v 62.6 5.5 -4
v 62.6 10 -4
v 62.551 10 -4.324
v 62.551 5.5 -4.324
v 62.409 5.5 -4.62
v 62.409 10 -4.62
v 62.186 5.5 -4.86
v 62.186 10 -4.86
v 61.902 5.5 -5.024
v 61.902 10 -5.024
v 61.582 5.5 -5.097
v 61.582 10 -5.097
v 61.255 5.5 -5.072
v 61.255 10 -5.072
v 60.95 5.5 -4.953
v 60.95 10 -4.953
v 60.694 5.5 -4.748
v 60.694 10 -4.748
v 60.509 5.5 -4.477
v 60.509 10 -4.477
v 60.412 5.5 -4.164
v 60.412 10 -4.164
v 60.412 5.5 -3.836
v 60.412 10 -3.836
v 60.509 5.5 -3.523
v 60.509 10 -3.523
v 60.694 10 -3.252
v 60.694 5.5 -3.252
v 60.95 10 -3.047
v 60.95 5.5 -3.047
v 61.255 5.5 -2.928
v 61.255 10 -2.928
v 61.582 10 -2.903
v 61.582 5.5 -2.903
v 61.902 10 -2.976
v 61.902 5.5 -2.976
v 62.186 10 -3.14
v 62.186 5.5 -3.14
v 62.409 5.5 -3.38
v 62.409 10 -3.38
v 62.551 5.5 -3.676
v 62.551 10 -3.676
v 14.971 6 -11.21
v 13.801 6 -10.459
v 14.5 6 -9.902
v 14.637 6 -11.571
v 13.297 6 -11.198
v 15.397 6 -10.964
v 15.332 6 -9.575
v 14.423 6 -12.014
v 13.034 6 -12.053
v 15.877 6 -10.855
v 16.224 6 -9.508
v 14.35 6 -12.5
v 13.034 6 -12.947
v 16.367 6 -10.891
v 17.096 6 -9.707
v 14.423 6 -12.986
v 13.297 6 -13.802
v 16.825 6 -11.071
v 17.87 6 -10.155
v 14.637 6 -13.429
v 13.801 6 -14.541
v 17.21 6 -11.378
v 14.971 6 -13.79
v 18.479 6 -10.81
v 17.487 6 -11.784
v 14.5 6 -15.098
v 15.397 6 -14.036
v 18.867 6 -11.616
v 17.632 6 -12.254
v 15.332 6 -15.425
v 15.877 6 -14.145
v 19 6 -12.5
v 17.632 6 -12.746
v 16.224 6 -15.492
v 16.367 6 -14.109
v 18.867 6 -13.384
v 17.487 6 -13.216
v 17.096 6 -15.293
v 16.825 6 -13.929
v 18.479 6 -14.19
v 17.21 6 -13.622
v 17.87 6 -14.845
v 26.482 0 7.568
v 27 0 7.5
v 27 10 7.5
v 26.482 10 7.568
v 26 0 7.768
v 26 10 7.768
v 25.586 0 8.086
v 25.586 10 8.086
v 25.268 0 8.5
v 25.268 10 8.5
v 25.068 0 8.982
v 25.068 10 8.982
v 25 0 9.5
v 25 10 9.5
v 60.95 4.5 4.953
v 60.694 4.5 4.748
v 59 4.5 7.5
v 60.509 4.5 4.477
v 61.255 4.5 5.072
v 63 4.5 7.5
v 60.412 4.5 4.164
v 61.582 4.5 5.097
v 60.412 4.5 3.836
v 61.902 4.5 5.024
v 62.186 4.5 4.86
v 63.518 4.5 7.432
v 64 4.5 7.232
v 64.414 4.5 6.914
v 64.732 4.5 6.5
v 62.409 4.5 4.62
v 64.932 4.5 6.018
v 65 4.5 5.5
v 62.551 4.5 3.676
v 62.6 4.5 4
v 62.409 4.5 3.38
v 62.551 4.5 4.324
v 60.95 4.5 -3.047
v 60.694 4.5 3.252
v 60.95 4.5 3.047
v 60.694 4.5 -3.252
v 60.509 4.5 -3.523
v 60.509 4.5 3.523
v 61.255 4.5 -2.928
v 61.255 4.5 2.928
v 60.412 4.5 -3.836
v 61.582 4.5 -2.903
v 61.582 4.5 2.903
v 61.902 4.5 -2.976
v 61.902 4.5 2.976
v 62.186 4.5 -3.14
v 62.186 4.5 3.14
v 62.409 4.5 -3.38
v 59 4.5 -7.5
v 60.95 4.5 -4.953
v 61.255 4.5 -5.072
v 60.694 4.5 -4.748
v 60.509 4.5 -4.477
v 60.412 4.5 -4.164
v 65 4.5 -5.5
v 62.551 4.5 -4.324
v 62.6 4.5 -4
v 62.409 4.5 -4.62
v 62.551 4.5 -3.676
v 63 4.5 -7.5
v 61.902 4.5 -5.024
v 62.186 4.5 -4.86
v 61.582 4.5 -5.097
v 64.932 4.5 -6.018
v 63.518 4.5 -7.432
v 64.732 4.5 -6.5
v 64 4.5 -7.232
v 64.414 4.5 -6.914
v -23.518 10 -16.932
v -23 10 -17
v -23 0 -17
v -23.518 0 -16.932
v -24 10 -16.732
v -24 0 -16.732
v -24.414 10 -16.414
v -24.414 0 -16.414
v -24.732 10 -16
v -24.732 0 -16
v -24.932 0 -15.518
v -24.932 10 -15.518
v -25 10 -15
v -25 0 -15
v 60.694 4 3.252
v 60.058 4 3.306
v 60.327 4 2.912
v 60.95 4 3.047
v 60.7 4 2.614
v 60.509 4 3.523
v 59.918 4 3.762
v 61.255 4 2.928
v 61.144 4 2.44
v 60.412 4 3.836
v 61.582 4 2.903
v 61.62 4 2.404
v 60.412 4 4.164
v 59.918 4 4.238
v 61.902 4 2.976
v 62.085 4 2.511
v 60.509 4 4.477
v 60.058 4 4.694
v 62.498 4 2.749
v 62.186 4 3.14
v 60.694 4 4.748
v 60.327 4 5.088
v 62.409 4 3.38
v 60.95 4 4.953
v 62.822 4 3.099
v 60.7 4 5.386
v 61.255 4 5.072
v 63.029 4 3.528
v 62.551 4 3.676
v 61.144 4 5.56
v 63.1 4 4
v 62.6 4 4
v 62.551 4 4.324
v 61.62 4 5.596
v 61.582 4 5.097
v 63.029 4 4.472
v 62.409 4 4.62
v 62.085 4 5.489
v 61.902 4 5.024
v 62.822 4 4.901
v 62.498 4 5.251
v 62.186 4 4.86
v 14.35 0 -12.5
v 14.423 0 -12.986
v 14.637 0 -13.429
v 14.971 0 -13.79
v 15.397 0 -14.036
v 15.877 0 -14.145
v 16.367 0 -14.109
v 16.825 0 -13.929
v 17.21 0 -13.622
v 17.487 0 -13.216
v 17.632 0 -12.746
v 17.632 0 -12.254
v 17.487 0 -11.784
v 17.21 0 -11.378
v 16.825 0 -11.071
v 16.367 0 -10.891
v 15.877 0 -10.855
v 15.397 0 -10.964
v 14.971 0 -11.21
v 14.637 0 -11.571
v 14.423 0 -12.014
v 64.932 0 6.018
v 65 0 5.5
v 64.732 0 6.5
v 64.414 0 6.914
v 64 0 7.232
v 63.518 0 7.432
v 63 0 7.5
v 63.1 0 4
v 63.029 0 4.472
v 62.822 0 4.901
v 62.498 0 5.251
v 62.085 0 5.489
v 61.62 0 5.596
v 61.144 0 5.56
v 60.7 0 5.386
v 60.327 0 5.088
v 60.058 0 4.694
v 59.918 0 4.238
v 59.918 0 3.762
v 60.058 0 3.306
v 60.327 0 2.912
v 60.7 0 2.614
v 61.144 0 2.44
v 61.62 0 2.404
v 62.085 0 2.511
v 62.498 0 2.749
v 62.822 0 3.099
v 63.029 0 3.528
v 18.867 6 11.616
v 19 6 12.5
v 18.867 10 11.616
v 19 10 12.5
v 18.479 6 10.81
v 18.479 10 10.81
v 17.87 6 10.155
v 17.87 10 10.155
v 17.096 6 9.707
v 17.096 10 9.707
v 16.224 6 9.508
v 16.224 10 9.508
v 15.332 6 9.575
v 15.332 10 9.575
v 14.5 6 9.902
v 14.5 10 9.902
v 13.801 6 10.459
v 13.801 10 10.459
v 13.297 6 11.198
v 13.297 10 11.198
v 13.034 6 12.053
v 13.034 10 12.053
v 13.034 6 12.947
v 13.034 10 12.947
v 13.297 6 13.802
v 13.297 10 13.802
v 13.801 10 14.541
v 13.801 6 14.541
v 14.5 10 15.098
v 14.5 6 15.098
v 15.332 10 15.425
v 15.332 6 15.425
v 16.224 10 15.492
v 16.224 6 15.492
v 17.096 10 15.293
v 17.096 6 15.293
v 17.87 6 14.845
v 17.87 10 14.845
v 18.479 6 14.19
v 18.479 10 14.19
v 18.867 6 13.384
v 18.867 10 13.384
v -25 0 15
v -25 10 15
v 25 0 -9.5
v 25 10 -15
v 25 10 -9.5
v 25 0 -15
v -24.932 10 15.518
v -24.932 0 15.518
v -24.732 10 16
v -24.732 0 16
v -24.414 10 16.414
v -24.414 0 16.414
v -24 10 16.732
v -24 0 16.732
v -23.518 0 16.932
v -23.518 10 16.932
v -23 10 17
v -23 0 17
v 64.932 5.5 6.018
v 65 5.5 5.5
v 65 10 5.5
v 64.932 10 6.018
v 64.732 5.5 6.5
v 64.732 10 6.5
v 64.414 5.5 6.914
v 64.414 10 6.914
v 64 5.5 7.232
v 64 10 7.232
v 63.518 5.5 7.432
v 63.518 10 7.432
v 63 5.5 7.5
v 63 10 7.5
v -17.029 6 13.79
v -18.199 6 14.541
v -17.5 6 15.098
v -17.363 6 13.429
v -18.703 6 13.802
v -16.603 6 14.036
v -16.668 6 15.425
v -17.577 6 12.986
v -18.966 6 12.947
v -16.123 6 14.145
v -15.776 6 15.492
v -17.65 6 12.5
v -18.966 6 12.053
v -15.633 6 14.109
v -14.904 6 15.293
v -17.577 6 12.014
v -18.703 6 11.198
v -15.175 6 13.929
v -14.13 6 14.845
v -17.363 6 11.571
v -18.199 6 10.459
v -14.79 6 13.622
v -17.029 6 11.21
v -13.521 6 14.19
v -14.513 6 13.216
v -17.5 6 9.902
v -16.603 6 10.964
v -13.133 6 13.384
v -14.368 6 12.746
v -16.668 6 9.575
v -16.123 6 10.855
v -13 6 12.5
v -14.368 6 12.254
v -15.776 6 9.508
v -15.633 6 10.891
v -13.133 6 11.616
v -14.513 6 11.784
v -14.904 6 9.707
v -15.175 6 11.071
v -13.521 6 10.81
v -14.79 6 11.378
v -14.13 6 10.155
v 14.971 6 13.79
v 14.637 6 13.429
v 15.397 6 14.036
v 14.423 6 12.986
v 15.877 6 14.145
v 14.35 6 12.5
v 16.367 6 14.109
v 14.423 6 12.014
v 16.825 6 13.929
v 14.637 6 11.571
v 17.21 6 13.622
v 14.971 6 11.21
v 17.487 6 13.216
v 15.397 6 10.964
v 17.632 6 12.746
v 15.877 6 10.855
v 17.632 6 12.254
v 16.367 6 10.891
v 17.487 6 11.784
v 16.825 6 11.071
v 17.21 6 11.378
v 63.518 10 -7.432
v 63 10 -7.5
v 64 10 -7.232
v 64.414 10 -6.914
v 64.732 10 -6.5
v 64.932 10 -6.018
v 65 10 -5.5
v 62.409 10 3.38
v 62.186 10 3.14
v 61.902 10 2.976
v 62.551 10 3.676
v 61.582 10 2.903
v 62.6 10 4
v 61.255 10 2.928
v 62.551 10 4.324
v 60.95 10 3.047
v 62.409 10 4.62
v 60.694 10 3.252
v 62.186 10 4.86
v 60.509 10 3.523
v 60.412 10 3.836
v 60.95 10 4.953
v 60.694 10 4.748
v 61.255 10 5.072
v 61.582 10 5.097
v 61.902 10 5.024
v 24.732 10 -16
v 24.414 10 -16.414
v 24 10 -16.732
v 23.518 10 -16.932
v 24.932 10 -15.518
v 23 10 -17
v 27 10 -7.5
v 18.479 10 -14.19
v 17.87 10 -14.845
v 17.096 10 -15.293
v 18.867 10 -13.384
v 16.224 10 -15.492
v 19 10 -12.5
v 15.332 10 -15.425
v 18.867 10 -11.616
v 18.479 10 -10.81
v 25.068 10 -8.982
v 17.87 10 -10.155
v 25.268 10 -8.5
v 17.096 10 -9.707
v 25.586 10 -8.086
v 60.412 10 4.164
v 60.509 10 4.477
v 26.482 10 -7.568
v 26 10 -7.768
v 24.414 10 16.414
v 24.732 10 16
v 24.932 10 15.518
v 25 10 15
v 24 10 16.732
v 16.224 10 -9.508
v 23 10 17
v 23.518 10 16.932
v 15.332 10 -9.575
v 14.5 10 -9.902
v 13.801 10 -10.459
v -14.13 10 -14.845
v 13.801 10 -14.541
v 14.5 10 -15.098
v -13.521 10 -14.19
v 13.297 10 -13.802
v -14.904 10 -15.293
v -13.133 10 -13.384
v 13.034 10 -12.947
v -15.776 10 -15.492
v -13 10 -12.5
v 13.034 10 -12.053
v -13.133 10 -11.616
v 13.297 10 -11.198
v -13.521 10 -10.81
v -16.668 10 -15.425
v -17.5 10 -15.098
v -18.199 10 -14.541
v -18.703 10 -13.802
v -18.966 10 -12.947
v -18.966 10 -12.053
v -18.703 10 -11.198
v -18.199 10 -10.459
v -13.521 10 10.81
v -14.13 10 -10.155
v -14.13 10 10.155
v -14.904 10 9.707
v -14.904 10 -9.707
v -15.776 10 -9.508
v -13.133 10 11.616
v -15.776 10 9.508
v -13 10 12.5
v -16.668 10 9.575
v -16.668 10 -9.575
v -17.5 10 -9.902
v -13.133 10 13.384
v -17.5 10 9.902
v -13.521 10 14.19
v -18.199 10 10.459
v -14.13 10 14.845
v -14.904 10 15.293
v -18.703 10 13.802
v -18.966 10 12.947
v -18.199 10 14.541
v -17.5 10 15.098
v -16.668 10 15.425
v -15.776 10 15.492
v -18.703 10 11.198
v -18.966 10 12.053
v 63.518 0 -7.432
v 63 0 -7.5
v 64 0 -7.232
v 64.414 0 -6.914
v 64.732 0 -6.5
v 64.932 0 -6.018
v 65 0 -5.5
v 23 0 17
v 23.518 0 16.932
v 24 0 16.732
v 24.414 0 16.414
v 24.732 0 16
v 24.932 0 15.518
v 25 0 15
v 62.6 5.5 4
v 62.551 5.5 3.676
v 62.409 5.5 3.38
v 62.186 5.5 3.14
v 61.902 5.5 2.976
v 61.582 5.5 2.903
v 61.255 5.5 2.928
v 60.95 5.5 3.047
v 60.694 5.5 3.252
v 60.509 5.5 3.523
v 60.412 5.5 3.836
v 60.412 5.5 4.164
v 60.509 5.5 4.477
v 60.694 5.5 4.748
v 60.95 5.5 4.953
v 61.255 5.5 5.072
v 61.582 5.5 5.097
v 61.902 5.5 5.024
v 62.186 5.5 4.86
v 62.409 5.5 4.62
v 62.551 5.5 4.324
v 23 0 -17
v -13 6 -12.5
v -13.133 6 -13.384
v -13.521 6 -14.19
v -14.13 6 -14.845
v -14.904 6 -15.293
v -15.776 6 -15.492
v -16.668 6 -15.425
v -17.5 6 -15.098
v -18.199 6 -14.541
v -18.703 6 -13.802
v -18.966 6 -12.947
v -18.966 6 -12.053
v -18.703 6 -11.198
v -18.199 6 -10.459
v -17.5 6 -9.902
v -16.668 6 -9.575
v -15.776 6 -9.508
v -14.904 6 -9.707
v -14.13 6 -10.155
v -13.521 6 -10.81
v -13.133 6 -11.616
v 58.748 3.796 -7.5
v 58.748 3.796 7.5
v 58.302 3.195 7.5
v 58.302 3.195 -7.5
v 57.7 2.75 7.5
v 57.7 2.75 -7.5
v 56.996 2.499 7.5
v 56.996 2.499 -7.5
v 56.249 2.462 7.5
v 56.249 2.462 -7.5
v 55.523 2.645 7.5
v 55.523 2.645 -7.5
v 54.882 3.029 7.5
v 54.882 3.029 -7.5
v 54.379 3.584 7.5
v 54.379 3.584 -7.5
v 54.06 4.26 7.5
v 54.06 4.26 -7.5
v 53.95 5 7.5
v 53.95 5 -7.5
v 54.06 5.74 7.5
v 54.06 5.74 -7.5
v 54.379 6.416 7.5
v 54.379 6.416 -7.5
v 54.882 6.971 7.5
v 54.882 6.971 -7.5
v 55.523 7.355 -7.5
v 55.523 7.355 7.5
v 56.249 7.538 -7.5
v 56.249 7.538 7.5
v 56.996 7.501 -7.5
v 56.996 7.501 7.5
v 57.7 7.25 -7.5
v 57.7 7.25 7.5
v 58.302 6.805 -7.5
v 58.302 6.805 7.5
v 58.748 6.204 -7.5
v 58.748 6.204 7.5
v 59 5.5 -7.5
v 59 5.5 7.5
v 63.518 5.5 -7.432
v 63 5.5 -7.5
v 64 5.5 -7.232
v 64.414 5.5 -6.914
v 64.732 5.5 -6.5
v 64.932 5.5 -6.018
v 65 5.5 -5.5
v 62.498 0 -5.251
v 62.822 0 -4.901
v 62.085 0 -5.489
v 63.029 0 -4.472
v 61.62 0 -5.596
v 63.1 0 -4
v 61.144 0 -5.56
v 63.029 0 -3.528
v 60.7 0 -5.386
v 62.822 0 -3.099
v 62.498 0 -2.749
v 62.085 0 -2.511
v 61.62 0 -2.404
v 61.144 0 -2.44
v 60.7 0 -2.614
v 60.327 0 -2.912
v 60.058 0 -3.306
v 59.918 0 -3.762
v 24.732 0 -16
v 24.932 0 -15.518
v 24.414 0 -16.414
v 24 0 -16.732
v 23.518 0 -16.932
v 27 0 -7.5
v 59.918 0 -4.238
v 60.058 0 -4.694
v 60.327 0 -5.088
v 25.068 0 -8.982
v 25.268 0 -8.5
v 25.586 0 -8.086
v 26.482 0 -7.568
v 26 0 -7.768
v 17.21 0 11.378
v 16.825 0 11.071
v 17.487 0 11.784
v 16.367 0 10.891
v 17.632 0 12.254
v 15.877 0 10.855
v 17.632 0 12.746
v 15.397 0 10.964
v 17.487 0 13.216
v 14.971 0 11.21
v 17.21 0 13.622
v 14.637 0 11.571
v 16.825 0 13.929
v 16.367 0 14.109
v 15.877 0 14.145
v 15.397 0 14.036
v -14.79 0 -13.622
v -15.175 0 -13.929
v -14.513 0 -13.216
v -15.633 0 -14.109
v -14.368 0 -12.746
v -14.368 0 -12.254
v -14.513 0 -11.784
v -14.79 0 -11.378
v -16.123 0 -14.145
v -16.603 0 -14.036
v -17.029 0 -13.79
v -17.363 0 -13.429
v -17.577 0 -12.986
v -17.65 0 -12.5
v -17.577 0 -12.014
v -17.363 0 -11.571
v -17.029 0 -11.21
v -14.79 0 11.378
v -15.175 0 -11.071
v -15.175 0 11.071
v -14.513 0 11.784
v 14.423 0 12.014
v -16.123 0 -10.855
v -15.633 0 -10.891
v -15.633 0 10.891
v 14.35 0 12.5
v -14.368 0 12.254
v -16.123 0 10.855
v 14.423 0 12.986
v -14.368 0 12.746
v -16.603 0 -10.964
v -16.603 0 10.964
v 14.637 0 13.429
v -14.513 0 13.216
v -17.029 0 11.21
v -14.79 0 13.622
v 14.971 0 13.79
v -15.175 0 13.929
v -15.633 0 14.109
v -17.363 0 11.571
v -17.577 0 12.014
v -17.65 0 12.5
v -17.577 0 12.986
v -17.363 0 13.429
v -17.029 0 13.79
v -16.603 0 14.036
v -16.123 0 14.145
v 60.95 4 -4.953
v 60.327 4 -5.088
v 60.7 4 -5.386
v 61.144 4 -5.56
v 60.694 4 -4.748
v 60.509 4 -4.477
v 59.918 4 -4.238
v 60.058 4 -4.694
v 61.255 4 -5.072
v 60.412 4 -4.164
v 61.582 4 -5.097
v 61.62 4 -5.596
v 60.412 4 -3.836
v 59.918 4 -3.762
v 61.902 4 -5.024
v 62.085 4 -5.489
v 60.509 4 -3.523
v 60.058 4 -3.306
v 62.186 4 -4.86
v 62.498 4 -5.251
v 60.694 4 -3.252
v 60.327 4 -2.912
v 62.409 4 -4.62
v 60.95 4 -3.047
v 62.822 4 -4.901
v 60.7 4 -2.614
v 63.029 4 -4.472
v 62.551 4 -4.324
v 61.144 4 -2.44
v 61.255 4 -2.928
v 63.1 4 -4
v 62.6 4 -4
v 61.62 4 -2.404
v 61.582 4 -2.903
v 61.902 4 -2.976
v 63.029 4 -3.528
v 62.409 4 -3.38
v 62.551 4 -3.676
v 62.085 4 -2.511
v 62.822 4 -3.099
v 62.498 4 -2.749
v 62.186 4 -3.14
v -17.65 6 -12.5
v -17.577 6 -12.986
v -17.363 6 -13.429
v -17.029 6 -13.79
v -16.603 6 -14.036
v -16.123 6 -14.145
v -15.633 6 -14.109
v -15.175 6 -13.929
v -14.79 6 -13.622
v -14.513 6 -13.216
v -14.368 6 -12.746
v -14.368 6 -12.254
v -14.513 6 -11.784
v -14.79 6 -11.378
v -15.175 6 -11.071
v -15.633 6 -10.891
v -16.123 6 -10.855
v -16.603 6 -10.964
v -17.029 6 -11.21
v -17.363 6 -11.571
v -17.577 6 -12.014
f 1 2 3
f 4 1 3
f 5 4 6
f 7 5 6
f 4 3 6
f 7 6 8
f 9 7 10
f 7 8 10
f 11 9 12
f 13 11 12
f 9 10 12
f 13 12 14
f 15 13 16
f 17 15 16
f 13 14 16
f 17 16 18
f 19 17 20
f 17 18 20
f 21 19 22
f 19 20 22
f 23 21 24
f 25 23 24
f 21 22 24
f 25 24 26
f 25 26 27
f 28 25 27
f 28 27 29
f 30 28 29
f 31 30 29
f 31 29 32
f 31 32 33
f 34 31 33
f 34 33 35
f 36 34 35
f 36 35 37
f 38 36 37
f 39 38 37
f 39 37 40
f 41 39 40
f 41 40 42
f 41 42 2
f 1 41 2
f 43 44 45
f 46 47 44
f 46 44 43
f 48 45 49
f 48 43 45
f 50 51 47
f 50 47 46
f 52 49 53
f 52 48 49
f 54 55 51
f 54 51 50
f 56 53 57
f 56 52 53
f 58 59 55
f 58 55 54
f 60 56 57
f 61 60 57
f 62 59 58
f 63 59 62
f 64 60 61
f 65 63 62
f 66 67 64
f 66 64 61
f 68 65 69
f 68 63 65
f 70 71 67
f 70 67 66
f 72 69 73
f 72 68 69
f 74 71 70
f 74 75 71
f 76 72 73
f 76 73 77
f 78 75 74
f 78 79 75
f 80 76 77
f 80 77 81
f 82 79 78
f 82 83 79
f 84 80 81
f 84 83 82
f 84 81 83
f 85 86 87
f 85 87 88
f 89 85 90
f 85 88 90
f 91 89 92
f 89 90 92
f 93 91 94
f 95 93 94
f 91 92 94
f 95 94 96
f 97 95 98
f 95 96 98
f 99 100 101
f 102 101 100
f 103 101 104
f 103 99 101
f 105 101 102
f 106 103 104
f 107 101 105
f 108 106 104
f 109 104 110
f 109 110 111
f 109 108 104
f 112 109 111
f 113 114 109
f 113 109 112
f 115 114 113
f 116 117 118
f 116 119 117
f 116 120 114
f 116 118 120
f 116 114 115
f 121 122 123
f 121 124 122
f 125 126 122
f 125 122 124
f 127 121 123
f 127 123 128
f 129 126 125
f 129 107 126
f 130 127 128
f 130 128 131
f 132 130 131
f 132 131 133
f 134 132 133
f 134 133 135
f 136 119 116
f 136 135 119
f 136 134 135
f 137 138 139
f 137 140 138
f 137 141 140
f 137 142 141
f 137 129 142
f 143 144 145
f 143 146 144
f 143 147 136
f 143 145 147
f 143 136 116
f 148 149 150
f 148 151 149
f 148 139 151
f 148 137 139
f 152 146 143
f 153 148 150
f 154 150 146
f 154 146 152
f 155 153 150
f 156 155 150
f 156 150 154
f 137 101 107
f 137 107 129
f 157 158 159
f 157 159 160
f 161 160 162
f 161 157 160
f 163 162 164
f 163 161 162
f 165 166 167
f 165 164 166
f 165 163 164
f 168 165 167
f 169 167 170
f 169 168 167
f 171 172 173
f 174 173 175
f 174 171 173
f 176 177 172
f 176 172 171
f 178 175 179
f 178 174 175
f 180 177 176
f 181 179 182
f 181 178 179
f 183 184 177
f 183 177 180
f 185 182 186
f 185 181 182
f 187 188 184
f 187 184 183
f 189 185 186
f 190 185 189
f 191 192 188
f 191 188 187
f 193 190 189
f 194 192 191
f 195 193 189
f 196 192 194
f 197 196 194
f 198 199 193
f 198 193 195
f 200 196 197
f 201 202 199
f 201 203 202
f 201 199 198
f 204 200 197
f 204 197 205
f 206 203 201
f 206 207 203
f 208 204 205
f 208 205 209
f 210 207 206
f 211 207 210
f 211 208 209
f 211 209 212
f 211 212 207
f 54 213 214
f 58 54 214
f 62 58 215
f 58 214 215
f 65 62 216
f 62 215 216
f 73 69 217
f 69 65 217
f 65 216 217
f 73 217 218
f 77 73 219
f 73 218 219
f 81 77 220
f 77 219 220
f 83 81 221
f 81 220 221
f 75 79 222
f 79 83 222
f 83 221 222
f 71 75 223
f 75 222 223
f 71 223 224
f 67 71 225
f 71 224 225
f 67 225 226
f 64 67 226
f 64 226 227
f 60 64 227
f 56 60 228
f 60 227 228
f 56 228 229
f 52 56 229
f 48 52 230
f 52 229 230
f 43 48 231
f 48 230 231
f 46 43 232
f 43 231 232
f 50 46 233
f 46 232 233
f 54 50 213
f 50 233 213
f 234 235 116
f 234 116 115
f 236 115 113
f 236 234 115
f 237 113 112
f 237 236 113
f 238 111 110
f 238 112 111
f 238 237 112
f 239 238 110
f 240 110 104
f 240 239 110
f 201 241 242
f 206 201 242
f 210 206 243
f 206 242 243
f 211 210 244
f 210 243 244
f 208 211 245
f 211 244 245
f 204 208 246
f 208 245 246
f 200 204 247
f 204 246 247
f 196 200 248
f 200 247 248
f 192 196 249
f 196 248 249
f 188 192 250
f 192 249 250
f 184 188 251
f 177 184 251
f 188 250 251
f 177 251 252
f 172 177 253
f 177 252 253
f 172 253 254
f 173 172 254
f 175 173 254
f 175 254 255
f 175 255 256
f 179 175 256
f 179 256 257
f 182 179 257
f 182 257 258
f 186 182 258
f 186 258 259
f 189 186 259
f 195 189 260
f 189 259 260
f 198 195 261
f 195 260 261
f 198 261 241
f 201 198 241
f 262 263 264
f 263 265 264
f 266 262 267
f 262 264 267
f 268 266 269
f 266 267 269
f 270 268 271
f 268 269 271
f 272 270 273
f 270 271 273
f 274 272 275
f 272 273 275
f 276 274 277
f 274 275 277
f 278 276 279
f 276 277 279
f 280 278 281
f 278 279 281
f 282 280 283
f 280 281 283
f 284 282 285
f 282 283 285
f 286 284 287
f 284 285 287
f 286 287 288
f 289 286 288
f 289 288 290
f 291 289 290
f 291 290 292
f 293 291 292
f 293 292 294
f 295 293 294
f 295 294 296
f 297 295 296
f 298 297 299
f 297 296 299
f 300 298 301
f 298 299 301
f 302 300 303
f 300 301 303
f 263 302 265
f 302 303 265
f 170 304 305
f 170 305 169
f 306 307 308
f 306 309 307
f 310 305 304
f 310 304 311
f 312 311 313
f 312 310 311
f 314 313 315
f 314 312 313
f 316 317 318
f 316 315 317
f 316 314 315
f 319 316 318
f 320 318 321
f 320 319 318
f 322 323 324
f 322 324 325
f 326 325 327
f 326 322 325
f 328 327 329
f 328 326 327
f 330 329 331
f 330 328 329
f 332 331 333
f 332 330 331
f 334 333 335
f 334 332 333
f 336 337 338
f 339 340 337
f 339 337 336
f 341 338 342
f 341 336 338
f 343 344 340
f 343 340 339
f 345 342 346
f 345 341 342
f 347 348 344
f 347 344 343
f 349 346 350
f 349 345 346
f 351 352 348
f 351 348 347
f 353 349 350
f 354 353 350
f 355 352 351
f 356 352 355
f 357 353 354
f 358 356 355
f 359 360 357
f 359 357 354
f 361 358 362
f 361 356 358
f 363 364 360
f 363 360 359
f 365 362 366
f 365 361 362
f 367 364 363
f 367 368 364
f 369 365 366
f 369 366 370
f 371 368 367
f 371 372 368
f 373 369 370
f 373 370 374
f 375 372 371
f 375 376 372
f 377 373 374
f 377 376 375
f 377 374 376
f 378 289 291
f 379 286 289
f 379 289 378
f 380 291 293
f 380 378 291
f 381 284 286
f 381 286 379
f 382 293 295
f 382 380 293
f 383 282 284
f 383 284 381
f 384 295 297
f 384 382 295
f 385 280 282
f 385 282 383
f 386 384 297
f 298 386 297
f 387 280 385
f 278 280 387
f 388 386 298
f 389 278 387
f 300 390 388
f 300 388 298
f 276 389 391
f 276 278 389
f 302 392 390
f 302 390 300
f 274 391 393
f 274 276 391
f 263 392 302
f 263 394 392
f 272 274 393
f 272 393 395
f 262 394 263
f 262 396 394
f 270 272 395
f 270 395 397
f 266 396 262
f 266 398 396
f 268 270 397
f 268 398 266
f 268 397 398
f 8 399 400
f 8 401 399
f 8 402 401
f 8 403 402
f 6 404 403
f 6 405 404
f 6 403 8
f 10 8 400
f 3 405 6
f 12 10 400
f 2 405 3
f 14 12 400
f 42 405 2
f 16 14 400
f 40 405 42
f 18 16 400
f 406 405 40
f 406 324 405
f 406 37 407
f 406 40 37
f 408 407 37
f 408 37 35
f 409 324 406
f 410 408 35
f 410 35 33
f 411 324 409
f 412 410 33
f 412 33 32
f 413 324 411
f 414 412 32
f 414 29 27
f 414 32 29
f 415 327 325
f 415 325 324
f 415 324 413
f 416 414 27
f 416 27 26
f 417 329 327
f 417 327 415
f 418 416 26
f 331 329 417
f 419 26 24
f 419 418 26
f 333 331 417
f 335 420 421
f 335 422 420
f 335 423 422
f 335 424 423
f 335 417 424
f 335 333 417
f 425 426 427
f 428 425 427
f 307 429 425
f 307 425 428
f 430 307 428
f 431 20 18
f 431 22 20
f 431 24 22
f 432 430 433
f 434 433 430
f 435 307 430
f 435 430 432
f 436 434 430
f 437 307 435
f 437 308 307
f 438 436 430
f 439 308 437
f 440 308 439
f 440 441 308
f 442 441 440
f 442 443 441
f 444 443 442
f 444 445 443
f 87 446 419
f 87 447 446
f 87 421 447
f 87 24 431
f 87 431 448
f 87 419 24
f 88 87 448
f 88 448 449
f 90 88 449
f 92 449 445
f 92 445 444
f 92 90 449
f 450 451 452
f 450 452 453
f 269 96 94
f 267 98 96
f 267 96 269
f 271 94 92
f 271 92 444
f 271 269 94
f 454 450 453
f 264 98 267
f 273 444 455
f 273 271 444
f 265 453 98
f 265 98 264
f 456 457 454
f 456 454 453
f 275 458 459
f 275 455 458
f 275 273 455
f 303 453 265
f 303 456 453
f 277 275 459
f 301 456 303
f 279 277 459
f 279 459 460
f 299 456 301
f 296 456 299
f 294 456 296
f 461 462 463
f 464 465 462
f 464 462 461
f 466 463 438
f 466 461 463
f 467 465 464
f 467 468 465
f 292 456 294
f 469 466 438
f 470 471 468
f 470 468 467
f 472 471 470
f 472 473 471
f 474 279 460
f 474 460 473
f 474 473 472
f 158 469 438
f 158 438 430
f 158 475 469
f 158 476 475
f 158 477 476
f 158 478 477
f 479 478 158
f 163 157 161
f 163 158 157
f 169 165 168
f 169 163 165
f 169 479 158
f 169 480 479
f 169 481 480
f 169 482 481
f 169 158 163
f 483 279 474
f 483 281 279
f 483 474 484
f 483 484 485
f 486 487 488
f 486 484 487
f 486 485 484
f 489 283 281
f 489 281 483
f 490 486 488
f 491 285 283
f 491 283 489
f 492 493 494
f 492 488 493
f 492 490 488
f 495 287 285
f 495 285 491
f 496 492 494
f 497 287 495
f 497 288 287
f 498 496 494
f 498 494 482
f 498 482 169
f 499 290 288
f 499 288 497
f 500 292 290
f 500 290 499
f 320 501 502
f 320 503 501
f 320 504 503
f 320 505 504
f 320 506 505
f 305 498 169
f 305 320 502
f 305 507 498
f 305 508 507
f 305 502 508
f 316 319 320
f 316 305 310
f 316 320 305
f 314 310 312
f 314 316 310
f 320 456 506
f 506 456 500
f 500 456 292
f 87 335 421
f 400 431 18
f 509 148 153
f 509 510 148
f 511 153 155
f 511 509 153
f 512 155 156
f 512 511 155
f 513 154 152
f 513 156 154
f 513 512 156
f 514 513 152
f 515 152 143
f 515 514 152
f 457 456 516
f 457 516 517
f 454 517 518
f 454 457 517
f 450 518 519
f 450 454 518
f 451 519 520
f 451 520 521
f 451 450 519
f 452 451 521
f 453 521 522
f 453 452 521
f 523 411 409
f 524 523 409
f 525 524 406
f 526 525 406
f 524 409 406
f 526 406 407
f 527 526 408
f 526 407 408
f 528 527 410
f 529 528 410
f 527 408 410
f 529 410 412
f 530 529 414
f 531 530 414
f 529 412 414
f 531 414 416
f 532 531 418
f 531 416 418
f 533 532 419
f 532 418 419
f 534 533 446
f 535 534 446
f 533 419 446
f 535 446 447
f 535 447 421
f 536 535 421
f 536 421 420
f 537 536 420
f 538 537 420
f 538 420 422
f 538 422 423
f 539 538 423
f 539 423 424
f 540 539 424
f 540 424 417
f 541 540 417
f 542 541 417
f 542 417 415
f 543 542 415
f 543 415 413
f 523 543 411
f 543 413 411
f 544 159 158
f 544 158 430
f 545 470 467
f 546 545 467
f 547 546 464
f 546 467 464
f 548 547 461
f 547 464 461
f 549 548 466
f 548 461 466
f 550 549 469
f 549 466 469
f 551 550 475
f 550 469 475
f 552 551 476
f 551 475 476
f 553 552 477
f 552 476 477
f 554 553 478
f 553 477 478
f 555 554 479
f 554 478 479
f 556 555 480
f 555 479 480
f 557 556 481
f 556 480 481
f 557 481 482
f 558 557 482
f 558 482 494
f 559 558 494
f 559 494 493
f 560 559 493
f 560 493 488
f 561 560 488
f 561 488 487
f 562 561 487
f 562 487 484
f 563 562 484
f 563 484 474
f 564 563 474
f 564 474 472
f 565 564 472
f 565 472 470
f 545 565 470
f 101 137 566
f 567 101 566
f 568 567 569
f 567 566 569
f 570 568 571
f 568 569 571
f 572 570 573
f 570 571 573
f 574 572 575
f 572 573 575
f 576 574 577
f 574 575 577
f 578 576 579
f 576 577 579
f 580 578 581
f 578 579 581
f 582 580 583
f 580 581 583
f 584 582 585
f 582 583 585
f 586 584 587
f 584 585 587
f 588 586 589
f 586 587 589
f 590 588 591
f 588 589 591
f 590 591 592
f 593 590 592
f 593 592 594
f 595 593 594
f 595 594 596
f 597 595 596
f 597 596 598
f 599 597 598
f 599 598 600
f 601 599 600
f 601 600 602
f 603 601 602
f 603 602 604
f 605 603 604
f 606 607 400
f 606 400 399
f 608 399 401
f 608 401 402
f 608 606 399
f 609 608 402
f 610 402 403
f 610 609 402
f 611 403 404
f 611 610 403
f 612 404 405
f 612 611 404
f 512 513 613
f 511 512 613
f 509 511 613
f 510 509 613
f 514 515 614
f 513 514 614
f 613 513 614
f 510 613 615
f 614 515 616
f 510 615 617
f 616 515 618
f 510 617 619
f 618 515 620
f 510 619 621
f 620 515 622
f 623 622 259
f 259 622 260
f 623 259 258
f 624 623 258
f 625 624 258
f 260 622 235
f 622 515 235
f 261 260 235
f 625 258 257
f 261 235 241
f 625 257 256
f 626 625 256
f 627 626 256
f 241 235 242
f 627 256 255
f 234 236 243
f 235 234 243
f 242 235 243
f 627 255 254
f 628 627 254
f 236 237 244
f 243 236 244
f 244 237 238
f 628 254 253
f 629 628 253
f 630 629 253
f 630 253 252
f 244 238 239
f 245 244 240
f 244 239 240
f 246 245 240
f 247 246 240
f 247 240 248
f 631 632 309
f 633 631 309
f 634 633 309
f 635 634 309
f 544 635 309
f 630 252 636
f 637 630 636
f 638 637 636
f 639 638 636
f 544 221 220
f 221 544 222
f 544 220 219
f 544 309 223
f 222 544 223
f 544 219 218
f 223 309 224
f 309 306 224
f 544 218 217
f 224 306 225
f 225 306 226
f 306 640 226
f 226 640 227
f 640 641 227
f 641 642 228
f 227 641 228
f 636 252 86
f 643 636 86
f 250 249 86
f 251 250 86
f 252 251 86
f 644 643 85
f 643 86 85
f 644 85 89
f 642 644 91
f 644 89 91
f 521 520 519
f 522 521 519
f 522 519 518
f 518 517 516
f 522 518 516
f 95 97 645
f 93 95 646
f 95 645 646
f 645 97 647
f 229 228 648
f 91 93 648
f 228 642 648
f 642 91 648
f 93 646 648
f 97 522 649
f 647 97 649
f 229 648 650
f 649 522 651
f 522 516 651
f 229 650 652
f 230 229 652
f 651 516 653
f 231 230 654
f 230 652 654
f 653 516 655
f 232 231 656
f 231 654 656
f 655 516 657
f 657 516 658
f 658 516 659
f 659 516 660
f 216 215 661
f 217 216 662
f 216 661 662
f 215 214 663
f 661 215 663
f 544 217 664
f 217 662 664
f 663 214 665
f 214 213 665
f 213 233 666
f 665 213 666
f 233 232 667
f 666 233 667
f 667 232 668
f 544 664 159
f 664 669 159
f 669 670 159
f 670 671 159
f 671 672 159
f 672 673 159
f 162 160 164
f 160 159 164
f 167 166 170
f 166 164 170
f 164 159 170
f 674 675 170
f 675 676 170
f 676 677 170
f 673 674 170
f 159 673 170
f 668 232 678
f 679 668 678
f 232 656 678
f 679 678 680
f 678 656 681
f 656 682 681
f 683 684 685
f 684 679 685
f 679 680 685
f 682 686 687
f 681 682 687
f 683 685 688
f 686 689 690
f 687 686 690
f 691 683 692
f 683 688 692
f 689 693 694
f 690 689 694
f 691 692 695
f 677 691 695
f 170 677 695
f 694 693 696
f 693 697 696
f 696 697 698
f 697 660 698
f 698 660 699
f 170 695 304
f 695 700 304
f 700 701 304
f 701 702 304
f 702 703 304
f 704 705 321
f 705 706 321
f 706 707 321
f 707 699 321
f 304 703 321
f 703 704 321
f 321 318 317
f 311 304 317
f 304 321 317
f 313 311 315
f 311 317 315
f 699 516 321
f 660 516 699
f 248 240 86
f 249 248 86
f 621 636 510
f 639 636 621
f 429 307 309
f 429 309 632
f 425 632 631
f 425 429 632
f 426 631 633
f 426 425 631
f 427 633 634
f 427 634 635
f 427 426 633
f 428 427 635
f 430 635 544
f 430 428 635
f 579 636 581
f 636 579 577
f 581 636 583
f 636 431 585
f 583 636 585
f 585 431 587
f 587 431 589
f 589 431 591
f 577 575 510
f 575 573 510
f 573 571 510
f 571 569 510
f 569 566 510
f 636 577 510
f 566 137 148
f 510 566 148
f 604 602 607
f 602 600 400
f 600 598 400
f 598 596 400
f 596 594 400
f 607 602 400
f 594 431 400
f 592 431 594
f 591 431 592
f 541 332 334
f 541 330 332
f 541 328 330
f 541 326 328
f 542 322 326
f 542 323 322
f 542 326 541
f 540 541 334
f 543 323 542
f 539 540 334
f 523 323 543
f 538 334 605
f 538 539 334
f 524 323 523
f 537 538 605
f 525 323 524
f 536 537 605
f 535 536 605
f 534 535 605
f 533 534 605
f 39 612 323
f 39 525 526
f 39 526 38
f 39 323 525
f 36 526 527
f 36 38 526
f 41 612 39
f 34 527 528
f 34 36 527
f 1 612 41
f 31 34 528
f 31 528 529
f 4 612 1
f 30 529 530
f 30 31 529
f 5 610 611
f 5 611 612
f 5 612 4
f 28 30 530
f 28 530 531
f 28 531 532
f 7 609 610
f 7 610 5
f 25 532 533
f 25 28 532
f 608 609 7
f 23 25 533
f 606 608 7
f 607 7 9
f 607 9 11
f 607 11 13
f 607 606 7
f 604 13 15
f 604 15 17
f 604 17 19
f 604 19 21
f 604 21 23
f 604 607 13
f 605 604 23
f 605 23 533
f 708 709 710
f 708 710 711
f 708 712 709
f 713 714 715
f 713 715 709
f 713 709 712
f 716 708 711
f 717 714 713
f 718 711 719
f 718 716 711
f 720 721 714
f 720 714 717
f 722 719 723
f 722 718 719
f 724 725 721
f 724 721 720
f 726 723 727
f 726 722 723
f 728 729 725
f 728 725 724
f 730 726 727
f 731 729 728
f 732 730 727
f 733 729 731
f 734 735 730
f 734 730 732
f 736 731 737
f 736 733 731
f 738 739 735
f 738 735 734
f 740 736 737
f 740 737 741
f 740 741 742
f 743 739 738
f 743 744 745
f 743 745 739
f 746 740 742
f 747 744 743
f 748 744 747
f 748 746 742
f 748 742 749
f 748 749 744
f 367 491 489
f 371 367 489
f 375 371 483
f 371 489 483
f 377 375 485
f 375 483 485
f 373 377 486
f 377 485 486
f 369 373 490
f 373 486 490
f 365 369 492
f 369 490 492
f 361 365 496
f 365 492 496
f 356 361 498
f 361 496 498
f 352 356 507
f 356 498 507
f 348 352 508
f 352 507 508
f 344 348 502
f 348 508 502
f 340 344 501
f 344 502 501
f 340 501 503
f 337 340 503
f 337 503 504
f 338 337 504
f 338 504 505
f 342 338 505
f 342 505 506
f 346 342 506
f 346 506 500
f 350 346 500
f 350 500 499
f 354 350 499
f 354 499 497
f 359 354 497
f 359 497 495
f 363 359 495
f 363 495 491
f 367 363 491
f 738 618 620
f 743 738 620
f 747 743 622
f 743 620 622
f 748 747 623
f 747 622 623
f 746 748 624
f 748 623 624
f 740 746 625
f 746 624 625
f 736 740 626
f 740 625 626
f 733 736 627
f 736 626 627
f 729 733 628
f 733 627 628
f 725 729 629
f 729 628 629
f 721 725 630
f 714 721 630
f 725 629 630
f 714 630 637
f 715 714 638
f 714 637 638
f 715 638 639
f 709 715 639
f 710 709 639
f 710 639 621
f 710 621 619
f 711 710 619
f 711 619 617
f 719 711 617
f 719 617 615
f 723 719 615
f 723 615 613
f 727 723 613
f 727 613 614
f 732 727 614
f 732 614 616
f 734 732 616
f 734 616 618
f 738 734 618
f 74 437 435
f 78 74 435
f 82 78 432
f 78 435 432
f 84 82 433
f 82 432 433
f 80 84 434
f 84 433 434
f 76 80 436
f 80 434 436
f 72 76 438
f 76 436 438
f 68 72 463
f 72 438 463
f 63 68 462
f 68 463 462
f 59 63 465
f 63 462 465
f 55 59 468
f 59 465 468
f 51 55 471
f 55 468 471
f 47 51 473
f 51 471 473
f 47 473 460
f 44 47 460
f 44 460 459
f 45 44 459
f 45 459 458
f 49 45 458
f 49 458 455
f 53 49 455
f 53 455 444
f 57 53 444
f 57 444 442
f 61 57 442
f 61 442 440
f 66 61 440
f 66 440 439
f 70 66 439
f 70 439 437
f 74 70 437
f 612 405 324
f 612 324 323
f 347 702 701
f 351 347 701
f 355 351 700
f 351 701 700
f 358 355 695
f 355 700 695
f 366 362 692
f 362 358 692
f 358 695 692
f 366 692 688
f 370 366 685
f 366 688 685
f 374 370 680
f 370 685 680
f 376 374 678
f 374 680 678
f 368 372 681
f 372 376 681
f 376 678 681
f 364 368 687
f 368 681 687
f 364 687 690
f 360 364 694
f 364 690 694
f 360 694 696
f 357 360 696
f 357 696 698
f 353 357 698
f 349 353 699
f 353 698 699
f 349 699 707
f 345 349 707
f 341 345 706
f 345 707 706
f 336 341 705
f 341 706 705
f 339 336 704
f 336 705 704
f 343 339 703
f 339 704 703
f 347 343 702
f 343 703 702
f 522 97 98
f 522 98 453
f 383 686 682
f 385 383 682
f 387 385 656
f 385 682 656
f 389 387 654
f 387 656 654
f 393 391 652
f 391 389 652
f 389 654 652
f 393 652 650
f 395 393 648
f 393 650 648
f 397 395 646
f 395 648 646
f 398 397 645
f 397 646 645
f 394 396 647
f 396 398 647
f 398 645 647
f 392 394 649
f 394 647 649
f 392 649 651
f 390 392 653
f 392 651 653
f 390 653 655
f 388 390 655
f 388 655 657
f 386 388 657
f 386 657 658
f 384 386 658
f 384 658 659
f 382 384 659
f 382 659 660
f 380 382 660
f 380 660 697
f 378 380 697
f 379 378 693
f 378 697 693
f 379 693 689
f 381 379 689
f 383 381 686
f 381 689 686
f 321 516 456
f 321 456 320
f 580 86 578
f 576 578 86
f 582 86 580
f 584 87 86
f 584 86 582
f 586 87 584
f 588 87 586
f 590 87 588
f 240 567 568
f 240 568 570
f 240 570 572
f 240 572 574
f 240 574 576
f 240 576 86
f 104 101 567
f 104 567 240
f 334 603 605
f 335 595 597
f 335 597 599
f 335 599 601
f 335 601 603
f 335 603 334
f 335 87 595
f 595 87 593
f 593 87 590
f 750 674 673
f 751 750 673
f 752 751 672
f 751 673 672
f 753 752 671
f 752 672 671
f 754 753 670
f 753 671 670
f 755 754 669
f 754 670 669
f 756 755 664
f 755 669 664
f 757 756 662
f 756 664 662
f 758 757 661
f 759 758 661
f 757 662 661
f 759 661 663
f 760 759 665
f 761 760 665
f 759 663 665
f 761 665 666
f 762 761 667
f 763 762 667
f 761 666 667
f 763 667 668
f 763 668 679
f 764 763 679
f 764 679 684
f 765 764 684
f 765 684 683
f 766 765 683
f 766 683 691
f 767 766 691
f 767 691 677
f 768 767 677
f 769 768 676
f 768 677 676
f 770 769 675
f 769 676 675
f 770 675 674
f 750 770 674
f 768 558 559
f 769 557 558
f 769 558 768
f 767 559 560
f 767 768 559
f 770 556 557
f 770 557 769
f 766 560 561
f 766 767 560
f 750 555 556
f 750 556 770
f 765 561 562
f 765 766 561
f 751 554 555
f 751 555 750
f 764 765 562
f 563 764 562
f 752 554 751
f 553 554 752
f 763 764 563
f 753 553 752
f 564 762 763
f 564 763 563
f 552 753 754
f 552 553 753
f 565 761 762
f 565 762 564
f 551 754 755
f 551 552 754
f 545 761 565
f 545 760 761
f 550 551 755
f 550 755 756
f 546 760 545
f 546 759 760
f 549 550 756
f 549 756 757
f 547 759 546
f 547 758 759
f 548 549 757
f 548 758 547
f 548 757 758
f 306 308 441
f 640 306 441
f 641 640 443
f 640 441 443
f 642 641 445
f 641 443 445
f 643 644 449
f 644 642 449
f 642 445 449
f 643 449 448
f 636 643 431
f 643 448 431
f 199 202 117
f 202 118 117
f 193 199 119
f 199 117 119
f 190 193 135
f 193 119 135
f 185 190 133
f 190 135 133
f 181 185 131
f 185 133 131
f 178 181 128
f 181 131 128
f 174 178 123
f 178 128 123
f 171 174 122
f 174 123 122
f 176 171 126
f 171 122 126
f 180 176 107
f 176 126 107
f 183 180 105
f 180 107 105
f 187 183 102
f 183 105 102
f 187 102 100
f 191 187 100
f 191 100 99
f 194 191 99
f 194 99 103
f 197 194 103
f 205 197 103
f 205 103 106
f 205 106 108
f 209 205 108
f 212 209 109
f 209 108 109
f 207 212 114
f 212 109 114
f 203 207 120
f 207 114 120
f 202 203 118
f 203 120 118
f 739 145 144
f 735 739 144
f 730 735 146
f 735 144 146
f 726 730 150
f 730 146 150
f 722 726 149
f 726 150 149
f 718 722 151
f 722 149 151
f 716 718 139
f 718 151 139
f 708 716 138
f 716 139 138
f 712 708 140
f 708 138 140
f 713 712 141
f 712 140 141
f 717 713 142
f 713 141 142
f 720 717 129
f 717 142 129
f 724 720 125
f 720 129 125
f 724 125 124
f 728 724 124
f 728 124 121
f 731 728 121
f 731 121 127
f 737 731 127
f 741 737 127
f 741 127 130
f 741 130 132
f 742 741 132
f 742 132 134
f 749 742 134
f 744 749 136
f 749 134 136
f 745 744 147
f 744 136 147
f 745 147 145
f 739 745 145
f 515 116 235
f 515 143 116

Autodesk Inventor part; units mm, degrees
ref_plane "YZ Plane" through (0, 0, 0) normal (1, 0, 0) x (0, 1, 0)
ref_plane "XZ Plane" through (0, 0, 0) normal (0, 1, 0) x (-1, 0, 0)
ref_plane "XY Plane" through (0, 0, 0) normal (0, 0, 1) x (1, 0, 0)
sketch "Sketch1" plane through (0, 0, 0) normal (0, 1, 0) x (-1, 0, 0)
  line L0 (-16, 12.5) -> (16, 12.5) construction
  line L1 (16, 12.5) -> (16, -12.5) construction
  line L2 (16, -12.5) -> (-16, -12.5) construction
  line L3 (-16, -12.5) -> (-16, 12.5) construction
  line L4 (-16, 12.5) -> (16, -12.5) construction
  line L5 (16, 12.5) -> (-16, -12.5) construction
  circle A0 centre (16, 12.5) radius 1.65
  circle A1 centre (16, -12.5) radius 1.65
  circle A2 centre (-16, -12.5) radius 1.65
  circle A3 centre (-16, 12.5) radius 1.65
  line L6 (-25, 17) -> (25, 17)
  line L7 (25, 17) -> (25, -17)
  line L8 (25, -17) -> (-25, -17)
  line L9 (-25, -17) -> (-25, 17)
  line L10 (-25, 17) -> (25, -17) construction
  line L11 (25, 17) -> (-25, -17) construction
  point P0 (0, 0)
  dimension "d0" = 32
  dimension "d1" = 25
  dimension "d2" = 3.3
  dimension "d3" = 3.3
  dimension "d4" = 3.3
  dimension "d5" = 3.3
  dimension "d6" = 50
  dimension "d7" = 34
extrude "Extrusion1" add sketch "Sketch1" along normal blind 10
sketch "Sketch2" plane through (0, 10, 0) normal (0, 1, 0) x (1, 0, 0)
  line L0 (-24, -7.5) -> (-12, -7.5)
  line L1 (-12, -7.5) -> (-12, 7.5)
  line L2 (-12, 7.5) -> (-24, 7.5)
  line L3 (-24, 7.5) -> (-24, -7.5)
  line L4 (-24, -7.5) -> (-12, 7.5) construction
  line L5 (-12, -7.5) -> (-24, 7.5) construction
  circle A0 centre (-16, -12.5) radius 1.65 projected
  circle A1 centre (-16, -12.5) radius 3 construction
  point P0 (0, 0)
  point P1 (-18, 0)
  dimension "d10" = 18
  dimension "d11" = 15
  dimension "d12" = 6
  dimension "d13" = 12
extrude "Extrusion2" [suppressed]
sketch "Sketch5" plane through (0, 0, 0) normal (0, 0, 1) x (1, 0, 0)
  line L0 (25, 10) -> (-25, 10) projected
  line L1 (-21.2587, 10) -> (-11, 10)
  line L2 (-11, 10) -> (-11, 19.7515)
  line L3 (-11, 19.7515) -> (-17.6064, 31.6553)
  line L4 (-17.6064, 31.6553) -> (-28.0988, 25.8321)
  line L5 (-28.0988, 25.8321) -> (-21.2587, 13.5072)
  line L6 (-21.2587, 13.5072) -> (-21.2587, 10)
  circle A0 centre (-18, 20) radius 2.6308
  line L7 (-25, 0) -> (-25, 10) projected
  point P0 (0, 0)
  dimension "d22" = 7
  dimension "d23" = 10
  dimension "d24" = 7
  dimension "d26" = 6
  dimension "d27" = 6
  dimension "d28" = 10
extrude "Extrusion4" [suppressed]
sketch "Sketch6" plane through (-17.6064, 27.6553, 6) normal (0.8744, 0.4853, 0) x (0, 0, -1)
  circle A0 centre (3, -3) radius 1.1
  line L0 (12, 0) -> (0, 0) projected
  line L1 (0, -13.6141) -> (0, 0) projected
  line L2 (6, 0) -> (6, -13.6141) construction
  line L3 (12, -13.6141) -> (0, -13.6141) projected
  circle A1 centre (9, -3) radius 1.1
  point P0 (6, -32.7246)
  dimension "d31" = 3
  dimension "d32" = 3
  dimension "d38" = 2.2
extrude "Extrusion5" [suppressed]
sketch "Sketch7" plane through (0, 0, 6) normal (0, 0, 1) x (1, 0, 0)
  line L0 (-28.2228, 33.3896) -> (-18.3568, 15.6125)
  line L1 (-18.3568, 15.6125) -> (-17.4824, 16.0978)
  line L2 (-17.4824, 16.0978) -> (-27.3485, 33.8749)
  line L3 (-27.3485, 33.8749) -> (-28.2228, 33.3896)
  line L4 (-17.6064, 27.6553) -> (-28.0988, 21.8321) projected
  line L5 (-28.2228, 33.3896) -> (-17.4824, 16.0978) construction
  line L6 (-18.3568, 15.6125) -> (-27.3485, 33.8749) construction
  point P0 (0, 0)
  point P1 (-22.8526, 24.7437)
  dimension "d35" = 1
extrude "Extrusion6" [suppressed]
sketch "Sketch8" plane through (-21.2587, 9.5072, -6) normal (-0.8744, -0.4853, 0) x (0, 0, 1)
  circle A0 centre (9, 11.0958) radius 1.1 projected
  circle A1 centre (9, 11.0958) radius 1.65
  circle A2 centre (3, 11.0958) radius 1.1 projected
  circle A3 centre (3, 11.0958) radius 1.65
  point P0 (6, -18.6288)
  dimension "d39" = 3.3
  dimension "d40" = 3.3
extrude "Extrusion7" [suppressed]
fillet "Fillet1" [suppressed]
chamfer "Chamfer1" [suppressed]
sketch "Sketch9" plane through (0, 10, 0) normal (0, 1, 0) x (1, 0, 0)
  circle A0 centre (-16, 12.5) radius 1.65 projected
  circle A1 centre (-16, 12.5) radius 3
  circle A2 centre (16, 12.5) radius 1.65 projected
  circle A3 centre (16, 12.5) radius 3
  circle A4 centre (16, -12.5) radius 1.65 projected
  circle A5 centre (16, -12.5) radius 3
  circle A6 centre (-16, -12.5) radius 1.65 projected
  circle A7 centre (-16, -12.5) radius 3
  point P0 (0, 0)
  dimension "d47" = 6
  dimension "d48" = 6
  dimension "d49" = 6
  dimension "d50" = 6
extrude "Extrusion8" cut sketch "Sketch9" against normal blind 4 contours A0 | A1 | A3 | A5 | A7
fillet "Fillet2" radius 2 4 edges at (25, 5, 17) (25, 5, -17) (-25, 5, 17) (-25, 5, -17)
sketch "Sketch11" plane through (0, 0, 0) normal (0, 0, 1) x (1, 0, 0)
  line L0 (25, 10) -> (-25, 10) projected
  line L1 (25, 10) -> (65, 10)
  line L2 (65, 10) -> (65, 0)
  line L3 (65, 0) -> (25, 0)
  line L4 (25, 0) -> (25, 10)
  point P0 (0, 0)
  dimension "d54" = 40
  dimension "d55" = 10
extrude "Extrusion9" add sketch "Sketch11" along normal mid plane 15
sketch "Sketch12" plane through (0, 0, -7.5) normal (0, 0, -1) x (-1, 0, 0)
  line L0 (-65, 10) -> (-65, 0) projected
  line L1 (-65, 5) -> (-56.5, 5) construction
  circle A0 centre (-56.5, 5) radius 2.55
  line L2 (-67.1062, 5.5) -> (-57.7546, 5.5)
  line L3 (-57.7546, 5.5) -> (-57.7546, 4.5)
  line L4 (-57.7546, 4.5) -> (-67.1062, 4.5)
  line L5 (-67.1062, 4.5) -> (-67.1062, 5.5)
  line L6 (-67.1062, 5.5) -> (-57.7546, 4.5) construction
  line L7 (-57.7546, 5.5) -> (-67.1062, 4.5) construction
  point P0 (0, 0)
  point P1 (-62.4304, 5)
  point P2 (-59.0005, 4.5)
  point P3 (-59.0005, 5.5)
  dimension "d58" = 5.1
  dimension "d59" = 8.5
  dimension "d67" = 1
extrude "Extrusion10" cut sketch "Sketch12" against normal blind 15
sketch "Sketch13" plane through (0, 10, 0) normal (0, 1, 0) x (1, 0, 0)
  circle A0 centre (61.5, 4) radius 1.1
  line L0 (25, 7.5) -> (65, 7.5) projected
  line L1 (65, 7.5) -> (65, -7.5) projected
  line L2 (65, 7.5) -> (65, -7.5) projected
  line L3 (65, 0) -> (0, 0) construction
  circle A1 centre (61.5, -4) radius 1.1
  dimension "d62" = 3.5
  dimension "d63" = 3.5
  dimension "d64" = 2.2
extrude "Extrusion11" cut sketch "Sketch13" against normal blind 10.25
sketch "Sketch14" plane through (25, 0, 7.5) normal (0, -1, 0) x (1, 0, 0)
  circle A0 centre (36.5, -3.5) radius 1.1 projected
  circle A1 centre (36.5, -3.5) radius 1.6
  circle A2 centre (36.5, -11.5) radius 1.1 projected
  circle A3 centre (36.5, -11.5) radius 1.6
  point P0 (-25, -7.5)
  dimension "d68" = 3.2
  dimension "d69" = 3.2
extrude "Extrusion12" cut sketch "Sketch14" against normal blind 4 contours A0 | A1 | A2 | A3
fillet "Fillet3" radius 2 4 edges at (65, 7.75, -7.5) (65, 2.25, -7.5) (65, 2.25, 7.5) (65, 7.75, 7.5)
fillet "Fillet4" radius 2 2 edges at (25, 5, -7.5) (25, 5, 7.5)
equation "\"d3\" = d2"
equation "\"d4\" = d2"
equation "\"d5\" = d2"
equation "\"d48\" = d47"
equation "\"d49\" = d47"
equation "\"d50\" = d47"
equation "\"d69\" = d68"
properties part number "Puller"
